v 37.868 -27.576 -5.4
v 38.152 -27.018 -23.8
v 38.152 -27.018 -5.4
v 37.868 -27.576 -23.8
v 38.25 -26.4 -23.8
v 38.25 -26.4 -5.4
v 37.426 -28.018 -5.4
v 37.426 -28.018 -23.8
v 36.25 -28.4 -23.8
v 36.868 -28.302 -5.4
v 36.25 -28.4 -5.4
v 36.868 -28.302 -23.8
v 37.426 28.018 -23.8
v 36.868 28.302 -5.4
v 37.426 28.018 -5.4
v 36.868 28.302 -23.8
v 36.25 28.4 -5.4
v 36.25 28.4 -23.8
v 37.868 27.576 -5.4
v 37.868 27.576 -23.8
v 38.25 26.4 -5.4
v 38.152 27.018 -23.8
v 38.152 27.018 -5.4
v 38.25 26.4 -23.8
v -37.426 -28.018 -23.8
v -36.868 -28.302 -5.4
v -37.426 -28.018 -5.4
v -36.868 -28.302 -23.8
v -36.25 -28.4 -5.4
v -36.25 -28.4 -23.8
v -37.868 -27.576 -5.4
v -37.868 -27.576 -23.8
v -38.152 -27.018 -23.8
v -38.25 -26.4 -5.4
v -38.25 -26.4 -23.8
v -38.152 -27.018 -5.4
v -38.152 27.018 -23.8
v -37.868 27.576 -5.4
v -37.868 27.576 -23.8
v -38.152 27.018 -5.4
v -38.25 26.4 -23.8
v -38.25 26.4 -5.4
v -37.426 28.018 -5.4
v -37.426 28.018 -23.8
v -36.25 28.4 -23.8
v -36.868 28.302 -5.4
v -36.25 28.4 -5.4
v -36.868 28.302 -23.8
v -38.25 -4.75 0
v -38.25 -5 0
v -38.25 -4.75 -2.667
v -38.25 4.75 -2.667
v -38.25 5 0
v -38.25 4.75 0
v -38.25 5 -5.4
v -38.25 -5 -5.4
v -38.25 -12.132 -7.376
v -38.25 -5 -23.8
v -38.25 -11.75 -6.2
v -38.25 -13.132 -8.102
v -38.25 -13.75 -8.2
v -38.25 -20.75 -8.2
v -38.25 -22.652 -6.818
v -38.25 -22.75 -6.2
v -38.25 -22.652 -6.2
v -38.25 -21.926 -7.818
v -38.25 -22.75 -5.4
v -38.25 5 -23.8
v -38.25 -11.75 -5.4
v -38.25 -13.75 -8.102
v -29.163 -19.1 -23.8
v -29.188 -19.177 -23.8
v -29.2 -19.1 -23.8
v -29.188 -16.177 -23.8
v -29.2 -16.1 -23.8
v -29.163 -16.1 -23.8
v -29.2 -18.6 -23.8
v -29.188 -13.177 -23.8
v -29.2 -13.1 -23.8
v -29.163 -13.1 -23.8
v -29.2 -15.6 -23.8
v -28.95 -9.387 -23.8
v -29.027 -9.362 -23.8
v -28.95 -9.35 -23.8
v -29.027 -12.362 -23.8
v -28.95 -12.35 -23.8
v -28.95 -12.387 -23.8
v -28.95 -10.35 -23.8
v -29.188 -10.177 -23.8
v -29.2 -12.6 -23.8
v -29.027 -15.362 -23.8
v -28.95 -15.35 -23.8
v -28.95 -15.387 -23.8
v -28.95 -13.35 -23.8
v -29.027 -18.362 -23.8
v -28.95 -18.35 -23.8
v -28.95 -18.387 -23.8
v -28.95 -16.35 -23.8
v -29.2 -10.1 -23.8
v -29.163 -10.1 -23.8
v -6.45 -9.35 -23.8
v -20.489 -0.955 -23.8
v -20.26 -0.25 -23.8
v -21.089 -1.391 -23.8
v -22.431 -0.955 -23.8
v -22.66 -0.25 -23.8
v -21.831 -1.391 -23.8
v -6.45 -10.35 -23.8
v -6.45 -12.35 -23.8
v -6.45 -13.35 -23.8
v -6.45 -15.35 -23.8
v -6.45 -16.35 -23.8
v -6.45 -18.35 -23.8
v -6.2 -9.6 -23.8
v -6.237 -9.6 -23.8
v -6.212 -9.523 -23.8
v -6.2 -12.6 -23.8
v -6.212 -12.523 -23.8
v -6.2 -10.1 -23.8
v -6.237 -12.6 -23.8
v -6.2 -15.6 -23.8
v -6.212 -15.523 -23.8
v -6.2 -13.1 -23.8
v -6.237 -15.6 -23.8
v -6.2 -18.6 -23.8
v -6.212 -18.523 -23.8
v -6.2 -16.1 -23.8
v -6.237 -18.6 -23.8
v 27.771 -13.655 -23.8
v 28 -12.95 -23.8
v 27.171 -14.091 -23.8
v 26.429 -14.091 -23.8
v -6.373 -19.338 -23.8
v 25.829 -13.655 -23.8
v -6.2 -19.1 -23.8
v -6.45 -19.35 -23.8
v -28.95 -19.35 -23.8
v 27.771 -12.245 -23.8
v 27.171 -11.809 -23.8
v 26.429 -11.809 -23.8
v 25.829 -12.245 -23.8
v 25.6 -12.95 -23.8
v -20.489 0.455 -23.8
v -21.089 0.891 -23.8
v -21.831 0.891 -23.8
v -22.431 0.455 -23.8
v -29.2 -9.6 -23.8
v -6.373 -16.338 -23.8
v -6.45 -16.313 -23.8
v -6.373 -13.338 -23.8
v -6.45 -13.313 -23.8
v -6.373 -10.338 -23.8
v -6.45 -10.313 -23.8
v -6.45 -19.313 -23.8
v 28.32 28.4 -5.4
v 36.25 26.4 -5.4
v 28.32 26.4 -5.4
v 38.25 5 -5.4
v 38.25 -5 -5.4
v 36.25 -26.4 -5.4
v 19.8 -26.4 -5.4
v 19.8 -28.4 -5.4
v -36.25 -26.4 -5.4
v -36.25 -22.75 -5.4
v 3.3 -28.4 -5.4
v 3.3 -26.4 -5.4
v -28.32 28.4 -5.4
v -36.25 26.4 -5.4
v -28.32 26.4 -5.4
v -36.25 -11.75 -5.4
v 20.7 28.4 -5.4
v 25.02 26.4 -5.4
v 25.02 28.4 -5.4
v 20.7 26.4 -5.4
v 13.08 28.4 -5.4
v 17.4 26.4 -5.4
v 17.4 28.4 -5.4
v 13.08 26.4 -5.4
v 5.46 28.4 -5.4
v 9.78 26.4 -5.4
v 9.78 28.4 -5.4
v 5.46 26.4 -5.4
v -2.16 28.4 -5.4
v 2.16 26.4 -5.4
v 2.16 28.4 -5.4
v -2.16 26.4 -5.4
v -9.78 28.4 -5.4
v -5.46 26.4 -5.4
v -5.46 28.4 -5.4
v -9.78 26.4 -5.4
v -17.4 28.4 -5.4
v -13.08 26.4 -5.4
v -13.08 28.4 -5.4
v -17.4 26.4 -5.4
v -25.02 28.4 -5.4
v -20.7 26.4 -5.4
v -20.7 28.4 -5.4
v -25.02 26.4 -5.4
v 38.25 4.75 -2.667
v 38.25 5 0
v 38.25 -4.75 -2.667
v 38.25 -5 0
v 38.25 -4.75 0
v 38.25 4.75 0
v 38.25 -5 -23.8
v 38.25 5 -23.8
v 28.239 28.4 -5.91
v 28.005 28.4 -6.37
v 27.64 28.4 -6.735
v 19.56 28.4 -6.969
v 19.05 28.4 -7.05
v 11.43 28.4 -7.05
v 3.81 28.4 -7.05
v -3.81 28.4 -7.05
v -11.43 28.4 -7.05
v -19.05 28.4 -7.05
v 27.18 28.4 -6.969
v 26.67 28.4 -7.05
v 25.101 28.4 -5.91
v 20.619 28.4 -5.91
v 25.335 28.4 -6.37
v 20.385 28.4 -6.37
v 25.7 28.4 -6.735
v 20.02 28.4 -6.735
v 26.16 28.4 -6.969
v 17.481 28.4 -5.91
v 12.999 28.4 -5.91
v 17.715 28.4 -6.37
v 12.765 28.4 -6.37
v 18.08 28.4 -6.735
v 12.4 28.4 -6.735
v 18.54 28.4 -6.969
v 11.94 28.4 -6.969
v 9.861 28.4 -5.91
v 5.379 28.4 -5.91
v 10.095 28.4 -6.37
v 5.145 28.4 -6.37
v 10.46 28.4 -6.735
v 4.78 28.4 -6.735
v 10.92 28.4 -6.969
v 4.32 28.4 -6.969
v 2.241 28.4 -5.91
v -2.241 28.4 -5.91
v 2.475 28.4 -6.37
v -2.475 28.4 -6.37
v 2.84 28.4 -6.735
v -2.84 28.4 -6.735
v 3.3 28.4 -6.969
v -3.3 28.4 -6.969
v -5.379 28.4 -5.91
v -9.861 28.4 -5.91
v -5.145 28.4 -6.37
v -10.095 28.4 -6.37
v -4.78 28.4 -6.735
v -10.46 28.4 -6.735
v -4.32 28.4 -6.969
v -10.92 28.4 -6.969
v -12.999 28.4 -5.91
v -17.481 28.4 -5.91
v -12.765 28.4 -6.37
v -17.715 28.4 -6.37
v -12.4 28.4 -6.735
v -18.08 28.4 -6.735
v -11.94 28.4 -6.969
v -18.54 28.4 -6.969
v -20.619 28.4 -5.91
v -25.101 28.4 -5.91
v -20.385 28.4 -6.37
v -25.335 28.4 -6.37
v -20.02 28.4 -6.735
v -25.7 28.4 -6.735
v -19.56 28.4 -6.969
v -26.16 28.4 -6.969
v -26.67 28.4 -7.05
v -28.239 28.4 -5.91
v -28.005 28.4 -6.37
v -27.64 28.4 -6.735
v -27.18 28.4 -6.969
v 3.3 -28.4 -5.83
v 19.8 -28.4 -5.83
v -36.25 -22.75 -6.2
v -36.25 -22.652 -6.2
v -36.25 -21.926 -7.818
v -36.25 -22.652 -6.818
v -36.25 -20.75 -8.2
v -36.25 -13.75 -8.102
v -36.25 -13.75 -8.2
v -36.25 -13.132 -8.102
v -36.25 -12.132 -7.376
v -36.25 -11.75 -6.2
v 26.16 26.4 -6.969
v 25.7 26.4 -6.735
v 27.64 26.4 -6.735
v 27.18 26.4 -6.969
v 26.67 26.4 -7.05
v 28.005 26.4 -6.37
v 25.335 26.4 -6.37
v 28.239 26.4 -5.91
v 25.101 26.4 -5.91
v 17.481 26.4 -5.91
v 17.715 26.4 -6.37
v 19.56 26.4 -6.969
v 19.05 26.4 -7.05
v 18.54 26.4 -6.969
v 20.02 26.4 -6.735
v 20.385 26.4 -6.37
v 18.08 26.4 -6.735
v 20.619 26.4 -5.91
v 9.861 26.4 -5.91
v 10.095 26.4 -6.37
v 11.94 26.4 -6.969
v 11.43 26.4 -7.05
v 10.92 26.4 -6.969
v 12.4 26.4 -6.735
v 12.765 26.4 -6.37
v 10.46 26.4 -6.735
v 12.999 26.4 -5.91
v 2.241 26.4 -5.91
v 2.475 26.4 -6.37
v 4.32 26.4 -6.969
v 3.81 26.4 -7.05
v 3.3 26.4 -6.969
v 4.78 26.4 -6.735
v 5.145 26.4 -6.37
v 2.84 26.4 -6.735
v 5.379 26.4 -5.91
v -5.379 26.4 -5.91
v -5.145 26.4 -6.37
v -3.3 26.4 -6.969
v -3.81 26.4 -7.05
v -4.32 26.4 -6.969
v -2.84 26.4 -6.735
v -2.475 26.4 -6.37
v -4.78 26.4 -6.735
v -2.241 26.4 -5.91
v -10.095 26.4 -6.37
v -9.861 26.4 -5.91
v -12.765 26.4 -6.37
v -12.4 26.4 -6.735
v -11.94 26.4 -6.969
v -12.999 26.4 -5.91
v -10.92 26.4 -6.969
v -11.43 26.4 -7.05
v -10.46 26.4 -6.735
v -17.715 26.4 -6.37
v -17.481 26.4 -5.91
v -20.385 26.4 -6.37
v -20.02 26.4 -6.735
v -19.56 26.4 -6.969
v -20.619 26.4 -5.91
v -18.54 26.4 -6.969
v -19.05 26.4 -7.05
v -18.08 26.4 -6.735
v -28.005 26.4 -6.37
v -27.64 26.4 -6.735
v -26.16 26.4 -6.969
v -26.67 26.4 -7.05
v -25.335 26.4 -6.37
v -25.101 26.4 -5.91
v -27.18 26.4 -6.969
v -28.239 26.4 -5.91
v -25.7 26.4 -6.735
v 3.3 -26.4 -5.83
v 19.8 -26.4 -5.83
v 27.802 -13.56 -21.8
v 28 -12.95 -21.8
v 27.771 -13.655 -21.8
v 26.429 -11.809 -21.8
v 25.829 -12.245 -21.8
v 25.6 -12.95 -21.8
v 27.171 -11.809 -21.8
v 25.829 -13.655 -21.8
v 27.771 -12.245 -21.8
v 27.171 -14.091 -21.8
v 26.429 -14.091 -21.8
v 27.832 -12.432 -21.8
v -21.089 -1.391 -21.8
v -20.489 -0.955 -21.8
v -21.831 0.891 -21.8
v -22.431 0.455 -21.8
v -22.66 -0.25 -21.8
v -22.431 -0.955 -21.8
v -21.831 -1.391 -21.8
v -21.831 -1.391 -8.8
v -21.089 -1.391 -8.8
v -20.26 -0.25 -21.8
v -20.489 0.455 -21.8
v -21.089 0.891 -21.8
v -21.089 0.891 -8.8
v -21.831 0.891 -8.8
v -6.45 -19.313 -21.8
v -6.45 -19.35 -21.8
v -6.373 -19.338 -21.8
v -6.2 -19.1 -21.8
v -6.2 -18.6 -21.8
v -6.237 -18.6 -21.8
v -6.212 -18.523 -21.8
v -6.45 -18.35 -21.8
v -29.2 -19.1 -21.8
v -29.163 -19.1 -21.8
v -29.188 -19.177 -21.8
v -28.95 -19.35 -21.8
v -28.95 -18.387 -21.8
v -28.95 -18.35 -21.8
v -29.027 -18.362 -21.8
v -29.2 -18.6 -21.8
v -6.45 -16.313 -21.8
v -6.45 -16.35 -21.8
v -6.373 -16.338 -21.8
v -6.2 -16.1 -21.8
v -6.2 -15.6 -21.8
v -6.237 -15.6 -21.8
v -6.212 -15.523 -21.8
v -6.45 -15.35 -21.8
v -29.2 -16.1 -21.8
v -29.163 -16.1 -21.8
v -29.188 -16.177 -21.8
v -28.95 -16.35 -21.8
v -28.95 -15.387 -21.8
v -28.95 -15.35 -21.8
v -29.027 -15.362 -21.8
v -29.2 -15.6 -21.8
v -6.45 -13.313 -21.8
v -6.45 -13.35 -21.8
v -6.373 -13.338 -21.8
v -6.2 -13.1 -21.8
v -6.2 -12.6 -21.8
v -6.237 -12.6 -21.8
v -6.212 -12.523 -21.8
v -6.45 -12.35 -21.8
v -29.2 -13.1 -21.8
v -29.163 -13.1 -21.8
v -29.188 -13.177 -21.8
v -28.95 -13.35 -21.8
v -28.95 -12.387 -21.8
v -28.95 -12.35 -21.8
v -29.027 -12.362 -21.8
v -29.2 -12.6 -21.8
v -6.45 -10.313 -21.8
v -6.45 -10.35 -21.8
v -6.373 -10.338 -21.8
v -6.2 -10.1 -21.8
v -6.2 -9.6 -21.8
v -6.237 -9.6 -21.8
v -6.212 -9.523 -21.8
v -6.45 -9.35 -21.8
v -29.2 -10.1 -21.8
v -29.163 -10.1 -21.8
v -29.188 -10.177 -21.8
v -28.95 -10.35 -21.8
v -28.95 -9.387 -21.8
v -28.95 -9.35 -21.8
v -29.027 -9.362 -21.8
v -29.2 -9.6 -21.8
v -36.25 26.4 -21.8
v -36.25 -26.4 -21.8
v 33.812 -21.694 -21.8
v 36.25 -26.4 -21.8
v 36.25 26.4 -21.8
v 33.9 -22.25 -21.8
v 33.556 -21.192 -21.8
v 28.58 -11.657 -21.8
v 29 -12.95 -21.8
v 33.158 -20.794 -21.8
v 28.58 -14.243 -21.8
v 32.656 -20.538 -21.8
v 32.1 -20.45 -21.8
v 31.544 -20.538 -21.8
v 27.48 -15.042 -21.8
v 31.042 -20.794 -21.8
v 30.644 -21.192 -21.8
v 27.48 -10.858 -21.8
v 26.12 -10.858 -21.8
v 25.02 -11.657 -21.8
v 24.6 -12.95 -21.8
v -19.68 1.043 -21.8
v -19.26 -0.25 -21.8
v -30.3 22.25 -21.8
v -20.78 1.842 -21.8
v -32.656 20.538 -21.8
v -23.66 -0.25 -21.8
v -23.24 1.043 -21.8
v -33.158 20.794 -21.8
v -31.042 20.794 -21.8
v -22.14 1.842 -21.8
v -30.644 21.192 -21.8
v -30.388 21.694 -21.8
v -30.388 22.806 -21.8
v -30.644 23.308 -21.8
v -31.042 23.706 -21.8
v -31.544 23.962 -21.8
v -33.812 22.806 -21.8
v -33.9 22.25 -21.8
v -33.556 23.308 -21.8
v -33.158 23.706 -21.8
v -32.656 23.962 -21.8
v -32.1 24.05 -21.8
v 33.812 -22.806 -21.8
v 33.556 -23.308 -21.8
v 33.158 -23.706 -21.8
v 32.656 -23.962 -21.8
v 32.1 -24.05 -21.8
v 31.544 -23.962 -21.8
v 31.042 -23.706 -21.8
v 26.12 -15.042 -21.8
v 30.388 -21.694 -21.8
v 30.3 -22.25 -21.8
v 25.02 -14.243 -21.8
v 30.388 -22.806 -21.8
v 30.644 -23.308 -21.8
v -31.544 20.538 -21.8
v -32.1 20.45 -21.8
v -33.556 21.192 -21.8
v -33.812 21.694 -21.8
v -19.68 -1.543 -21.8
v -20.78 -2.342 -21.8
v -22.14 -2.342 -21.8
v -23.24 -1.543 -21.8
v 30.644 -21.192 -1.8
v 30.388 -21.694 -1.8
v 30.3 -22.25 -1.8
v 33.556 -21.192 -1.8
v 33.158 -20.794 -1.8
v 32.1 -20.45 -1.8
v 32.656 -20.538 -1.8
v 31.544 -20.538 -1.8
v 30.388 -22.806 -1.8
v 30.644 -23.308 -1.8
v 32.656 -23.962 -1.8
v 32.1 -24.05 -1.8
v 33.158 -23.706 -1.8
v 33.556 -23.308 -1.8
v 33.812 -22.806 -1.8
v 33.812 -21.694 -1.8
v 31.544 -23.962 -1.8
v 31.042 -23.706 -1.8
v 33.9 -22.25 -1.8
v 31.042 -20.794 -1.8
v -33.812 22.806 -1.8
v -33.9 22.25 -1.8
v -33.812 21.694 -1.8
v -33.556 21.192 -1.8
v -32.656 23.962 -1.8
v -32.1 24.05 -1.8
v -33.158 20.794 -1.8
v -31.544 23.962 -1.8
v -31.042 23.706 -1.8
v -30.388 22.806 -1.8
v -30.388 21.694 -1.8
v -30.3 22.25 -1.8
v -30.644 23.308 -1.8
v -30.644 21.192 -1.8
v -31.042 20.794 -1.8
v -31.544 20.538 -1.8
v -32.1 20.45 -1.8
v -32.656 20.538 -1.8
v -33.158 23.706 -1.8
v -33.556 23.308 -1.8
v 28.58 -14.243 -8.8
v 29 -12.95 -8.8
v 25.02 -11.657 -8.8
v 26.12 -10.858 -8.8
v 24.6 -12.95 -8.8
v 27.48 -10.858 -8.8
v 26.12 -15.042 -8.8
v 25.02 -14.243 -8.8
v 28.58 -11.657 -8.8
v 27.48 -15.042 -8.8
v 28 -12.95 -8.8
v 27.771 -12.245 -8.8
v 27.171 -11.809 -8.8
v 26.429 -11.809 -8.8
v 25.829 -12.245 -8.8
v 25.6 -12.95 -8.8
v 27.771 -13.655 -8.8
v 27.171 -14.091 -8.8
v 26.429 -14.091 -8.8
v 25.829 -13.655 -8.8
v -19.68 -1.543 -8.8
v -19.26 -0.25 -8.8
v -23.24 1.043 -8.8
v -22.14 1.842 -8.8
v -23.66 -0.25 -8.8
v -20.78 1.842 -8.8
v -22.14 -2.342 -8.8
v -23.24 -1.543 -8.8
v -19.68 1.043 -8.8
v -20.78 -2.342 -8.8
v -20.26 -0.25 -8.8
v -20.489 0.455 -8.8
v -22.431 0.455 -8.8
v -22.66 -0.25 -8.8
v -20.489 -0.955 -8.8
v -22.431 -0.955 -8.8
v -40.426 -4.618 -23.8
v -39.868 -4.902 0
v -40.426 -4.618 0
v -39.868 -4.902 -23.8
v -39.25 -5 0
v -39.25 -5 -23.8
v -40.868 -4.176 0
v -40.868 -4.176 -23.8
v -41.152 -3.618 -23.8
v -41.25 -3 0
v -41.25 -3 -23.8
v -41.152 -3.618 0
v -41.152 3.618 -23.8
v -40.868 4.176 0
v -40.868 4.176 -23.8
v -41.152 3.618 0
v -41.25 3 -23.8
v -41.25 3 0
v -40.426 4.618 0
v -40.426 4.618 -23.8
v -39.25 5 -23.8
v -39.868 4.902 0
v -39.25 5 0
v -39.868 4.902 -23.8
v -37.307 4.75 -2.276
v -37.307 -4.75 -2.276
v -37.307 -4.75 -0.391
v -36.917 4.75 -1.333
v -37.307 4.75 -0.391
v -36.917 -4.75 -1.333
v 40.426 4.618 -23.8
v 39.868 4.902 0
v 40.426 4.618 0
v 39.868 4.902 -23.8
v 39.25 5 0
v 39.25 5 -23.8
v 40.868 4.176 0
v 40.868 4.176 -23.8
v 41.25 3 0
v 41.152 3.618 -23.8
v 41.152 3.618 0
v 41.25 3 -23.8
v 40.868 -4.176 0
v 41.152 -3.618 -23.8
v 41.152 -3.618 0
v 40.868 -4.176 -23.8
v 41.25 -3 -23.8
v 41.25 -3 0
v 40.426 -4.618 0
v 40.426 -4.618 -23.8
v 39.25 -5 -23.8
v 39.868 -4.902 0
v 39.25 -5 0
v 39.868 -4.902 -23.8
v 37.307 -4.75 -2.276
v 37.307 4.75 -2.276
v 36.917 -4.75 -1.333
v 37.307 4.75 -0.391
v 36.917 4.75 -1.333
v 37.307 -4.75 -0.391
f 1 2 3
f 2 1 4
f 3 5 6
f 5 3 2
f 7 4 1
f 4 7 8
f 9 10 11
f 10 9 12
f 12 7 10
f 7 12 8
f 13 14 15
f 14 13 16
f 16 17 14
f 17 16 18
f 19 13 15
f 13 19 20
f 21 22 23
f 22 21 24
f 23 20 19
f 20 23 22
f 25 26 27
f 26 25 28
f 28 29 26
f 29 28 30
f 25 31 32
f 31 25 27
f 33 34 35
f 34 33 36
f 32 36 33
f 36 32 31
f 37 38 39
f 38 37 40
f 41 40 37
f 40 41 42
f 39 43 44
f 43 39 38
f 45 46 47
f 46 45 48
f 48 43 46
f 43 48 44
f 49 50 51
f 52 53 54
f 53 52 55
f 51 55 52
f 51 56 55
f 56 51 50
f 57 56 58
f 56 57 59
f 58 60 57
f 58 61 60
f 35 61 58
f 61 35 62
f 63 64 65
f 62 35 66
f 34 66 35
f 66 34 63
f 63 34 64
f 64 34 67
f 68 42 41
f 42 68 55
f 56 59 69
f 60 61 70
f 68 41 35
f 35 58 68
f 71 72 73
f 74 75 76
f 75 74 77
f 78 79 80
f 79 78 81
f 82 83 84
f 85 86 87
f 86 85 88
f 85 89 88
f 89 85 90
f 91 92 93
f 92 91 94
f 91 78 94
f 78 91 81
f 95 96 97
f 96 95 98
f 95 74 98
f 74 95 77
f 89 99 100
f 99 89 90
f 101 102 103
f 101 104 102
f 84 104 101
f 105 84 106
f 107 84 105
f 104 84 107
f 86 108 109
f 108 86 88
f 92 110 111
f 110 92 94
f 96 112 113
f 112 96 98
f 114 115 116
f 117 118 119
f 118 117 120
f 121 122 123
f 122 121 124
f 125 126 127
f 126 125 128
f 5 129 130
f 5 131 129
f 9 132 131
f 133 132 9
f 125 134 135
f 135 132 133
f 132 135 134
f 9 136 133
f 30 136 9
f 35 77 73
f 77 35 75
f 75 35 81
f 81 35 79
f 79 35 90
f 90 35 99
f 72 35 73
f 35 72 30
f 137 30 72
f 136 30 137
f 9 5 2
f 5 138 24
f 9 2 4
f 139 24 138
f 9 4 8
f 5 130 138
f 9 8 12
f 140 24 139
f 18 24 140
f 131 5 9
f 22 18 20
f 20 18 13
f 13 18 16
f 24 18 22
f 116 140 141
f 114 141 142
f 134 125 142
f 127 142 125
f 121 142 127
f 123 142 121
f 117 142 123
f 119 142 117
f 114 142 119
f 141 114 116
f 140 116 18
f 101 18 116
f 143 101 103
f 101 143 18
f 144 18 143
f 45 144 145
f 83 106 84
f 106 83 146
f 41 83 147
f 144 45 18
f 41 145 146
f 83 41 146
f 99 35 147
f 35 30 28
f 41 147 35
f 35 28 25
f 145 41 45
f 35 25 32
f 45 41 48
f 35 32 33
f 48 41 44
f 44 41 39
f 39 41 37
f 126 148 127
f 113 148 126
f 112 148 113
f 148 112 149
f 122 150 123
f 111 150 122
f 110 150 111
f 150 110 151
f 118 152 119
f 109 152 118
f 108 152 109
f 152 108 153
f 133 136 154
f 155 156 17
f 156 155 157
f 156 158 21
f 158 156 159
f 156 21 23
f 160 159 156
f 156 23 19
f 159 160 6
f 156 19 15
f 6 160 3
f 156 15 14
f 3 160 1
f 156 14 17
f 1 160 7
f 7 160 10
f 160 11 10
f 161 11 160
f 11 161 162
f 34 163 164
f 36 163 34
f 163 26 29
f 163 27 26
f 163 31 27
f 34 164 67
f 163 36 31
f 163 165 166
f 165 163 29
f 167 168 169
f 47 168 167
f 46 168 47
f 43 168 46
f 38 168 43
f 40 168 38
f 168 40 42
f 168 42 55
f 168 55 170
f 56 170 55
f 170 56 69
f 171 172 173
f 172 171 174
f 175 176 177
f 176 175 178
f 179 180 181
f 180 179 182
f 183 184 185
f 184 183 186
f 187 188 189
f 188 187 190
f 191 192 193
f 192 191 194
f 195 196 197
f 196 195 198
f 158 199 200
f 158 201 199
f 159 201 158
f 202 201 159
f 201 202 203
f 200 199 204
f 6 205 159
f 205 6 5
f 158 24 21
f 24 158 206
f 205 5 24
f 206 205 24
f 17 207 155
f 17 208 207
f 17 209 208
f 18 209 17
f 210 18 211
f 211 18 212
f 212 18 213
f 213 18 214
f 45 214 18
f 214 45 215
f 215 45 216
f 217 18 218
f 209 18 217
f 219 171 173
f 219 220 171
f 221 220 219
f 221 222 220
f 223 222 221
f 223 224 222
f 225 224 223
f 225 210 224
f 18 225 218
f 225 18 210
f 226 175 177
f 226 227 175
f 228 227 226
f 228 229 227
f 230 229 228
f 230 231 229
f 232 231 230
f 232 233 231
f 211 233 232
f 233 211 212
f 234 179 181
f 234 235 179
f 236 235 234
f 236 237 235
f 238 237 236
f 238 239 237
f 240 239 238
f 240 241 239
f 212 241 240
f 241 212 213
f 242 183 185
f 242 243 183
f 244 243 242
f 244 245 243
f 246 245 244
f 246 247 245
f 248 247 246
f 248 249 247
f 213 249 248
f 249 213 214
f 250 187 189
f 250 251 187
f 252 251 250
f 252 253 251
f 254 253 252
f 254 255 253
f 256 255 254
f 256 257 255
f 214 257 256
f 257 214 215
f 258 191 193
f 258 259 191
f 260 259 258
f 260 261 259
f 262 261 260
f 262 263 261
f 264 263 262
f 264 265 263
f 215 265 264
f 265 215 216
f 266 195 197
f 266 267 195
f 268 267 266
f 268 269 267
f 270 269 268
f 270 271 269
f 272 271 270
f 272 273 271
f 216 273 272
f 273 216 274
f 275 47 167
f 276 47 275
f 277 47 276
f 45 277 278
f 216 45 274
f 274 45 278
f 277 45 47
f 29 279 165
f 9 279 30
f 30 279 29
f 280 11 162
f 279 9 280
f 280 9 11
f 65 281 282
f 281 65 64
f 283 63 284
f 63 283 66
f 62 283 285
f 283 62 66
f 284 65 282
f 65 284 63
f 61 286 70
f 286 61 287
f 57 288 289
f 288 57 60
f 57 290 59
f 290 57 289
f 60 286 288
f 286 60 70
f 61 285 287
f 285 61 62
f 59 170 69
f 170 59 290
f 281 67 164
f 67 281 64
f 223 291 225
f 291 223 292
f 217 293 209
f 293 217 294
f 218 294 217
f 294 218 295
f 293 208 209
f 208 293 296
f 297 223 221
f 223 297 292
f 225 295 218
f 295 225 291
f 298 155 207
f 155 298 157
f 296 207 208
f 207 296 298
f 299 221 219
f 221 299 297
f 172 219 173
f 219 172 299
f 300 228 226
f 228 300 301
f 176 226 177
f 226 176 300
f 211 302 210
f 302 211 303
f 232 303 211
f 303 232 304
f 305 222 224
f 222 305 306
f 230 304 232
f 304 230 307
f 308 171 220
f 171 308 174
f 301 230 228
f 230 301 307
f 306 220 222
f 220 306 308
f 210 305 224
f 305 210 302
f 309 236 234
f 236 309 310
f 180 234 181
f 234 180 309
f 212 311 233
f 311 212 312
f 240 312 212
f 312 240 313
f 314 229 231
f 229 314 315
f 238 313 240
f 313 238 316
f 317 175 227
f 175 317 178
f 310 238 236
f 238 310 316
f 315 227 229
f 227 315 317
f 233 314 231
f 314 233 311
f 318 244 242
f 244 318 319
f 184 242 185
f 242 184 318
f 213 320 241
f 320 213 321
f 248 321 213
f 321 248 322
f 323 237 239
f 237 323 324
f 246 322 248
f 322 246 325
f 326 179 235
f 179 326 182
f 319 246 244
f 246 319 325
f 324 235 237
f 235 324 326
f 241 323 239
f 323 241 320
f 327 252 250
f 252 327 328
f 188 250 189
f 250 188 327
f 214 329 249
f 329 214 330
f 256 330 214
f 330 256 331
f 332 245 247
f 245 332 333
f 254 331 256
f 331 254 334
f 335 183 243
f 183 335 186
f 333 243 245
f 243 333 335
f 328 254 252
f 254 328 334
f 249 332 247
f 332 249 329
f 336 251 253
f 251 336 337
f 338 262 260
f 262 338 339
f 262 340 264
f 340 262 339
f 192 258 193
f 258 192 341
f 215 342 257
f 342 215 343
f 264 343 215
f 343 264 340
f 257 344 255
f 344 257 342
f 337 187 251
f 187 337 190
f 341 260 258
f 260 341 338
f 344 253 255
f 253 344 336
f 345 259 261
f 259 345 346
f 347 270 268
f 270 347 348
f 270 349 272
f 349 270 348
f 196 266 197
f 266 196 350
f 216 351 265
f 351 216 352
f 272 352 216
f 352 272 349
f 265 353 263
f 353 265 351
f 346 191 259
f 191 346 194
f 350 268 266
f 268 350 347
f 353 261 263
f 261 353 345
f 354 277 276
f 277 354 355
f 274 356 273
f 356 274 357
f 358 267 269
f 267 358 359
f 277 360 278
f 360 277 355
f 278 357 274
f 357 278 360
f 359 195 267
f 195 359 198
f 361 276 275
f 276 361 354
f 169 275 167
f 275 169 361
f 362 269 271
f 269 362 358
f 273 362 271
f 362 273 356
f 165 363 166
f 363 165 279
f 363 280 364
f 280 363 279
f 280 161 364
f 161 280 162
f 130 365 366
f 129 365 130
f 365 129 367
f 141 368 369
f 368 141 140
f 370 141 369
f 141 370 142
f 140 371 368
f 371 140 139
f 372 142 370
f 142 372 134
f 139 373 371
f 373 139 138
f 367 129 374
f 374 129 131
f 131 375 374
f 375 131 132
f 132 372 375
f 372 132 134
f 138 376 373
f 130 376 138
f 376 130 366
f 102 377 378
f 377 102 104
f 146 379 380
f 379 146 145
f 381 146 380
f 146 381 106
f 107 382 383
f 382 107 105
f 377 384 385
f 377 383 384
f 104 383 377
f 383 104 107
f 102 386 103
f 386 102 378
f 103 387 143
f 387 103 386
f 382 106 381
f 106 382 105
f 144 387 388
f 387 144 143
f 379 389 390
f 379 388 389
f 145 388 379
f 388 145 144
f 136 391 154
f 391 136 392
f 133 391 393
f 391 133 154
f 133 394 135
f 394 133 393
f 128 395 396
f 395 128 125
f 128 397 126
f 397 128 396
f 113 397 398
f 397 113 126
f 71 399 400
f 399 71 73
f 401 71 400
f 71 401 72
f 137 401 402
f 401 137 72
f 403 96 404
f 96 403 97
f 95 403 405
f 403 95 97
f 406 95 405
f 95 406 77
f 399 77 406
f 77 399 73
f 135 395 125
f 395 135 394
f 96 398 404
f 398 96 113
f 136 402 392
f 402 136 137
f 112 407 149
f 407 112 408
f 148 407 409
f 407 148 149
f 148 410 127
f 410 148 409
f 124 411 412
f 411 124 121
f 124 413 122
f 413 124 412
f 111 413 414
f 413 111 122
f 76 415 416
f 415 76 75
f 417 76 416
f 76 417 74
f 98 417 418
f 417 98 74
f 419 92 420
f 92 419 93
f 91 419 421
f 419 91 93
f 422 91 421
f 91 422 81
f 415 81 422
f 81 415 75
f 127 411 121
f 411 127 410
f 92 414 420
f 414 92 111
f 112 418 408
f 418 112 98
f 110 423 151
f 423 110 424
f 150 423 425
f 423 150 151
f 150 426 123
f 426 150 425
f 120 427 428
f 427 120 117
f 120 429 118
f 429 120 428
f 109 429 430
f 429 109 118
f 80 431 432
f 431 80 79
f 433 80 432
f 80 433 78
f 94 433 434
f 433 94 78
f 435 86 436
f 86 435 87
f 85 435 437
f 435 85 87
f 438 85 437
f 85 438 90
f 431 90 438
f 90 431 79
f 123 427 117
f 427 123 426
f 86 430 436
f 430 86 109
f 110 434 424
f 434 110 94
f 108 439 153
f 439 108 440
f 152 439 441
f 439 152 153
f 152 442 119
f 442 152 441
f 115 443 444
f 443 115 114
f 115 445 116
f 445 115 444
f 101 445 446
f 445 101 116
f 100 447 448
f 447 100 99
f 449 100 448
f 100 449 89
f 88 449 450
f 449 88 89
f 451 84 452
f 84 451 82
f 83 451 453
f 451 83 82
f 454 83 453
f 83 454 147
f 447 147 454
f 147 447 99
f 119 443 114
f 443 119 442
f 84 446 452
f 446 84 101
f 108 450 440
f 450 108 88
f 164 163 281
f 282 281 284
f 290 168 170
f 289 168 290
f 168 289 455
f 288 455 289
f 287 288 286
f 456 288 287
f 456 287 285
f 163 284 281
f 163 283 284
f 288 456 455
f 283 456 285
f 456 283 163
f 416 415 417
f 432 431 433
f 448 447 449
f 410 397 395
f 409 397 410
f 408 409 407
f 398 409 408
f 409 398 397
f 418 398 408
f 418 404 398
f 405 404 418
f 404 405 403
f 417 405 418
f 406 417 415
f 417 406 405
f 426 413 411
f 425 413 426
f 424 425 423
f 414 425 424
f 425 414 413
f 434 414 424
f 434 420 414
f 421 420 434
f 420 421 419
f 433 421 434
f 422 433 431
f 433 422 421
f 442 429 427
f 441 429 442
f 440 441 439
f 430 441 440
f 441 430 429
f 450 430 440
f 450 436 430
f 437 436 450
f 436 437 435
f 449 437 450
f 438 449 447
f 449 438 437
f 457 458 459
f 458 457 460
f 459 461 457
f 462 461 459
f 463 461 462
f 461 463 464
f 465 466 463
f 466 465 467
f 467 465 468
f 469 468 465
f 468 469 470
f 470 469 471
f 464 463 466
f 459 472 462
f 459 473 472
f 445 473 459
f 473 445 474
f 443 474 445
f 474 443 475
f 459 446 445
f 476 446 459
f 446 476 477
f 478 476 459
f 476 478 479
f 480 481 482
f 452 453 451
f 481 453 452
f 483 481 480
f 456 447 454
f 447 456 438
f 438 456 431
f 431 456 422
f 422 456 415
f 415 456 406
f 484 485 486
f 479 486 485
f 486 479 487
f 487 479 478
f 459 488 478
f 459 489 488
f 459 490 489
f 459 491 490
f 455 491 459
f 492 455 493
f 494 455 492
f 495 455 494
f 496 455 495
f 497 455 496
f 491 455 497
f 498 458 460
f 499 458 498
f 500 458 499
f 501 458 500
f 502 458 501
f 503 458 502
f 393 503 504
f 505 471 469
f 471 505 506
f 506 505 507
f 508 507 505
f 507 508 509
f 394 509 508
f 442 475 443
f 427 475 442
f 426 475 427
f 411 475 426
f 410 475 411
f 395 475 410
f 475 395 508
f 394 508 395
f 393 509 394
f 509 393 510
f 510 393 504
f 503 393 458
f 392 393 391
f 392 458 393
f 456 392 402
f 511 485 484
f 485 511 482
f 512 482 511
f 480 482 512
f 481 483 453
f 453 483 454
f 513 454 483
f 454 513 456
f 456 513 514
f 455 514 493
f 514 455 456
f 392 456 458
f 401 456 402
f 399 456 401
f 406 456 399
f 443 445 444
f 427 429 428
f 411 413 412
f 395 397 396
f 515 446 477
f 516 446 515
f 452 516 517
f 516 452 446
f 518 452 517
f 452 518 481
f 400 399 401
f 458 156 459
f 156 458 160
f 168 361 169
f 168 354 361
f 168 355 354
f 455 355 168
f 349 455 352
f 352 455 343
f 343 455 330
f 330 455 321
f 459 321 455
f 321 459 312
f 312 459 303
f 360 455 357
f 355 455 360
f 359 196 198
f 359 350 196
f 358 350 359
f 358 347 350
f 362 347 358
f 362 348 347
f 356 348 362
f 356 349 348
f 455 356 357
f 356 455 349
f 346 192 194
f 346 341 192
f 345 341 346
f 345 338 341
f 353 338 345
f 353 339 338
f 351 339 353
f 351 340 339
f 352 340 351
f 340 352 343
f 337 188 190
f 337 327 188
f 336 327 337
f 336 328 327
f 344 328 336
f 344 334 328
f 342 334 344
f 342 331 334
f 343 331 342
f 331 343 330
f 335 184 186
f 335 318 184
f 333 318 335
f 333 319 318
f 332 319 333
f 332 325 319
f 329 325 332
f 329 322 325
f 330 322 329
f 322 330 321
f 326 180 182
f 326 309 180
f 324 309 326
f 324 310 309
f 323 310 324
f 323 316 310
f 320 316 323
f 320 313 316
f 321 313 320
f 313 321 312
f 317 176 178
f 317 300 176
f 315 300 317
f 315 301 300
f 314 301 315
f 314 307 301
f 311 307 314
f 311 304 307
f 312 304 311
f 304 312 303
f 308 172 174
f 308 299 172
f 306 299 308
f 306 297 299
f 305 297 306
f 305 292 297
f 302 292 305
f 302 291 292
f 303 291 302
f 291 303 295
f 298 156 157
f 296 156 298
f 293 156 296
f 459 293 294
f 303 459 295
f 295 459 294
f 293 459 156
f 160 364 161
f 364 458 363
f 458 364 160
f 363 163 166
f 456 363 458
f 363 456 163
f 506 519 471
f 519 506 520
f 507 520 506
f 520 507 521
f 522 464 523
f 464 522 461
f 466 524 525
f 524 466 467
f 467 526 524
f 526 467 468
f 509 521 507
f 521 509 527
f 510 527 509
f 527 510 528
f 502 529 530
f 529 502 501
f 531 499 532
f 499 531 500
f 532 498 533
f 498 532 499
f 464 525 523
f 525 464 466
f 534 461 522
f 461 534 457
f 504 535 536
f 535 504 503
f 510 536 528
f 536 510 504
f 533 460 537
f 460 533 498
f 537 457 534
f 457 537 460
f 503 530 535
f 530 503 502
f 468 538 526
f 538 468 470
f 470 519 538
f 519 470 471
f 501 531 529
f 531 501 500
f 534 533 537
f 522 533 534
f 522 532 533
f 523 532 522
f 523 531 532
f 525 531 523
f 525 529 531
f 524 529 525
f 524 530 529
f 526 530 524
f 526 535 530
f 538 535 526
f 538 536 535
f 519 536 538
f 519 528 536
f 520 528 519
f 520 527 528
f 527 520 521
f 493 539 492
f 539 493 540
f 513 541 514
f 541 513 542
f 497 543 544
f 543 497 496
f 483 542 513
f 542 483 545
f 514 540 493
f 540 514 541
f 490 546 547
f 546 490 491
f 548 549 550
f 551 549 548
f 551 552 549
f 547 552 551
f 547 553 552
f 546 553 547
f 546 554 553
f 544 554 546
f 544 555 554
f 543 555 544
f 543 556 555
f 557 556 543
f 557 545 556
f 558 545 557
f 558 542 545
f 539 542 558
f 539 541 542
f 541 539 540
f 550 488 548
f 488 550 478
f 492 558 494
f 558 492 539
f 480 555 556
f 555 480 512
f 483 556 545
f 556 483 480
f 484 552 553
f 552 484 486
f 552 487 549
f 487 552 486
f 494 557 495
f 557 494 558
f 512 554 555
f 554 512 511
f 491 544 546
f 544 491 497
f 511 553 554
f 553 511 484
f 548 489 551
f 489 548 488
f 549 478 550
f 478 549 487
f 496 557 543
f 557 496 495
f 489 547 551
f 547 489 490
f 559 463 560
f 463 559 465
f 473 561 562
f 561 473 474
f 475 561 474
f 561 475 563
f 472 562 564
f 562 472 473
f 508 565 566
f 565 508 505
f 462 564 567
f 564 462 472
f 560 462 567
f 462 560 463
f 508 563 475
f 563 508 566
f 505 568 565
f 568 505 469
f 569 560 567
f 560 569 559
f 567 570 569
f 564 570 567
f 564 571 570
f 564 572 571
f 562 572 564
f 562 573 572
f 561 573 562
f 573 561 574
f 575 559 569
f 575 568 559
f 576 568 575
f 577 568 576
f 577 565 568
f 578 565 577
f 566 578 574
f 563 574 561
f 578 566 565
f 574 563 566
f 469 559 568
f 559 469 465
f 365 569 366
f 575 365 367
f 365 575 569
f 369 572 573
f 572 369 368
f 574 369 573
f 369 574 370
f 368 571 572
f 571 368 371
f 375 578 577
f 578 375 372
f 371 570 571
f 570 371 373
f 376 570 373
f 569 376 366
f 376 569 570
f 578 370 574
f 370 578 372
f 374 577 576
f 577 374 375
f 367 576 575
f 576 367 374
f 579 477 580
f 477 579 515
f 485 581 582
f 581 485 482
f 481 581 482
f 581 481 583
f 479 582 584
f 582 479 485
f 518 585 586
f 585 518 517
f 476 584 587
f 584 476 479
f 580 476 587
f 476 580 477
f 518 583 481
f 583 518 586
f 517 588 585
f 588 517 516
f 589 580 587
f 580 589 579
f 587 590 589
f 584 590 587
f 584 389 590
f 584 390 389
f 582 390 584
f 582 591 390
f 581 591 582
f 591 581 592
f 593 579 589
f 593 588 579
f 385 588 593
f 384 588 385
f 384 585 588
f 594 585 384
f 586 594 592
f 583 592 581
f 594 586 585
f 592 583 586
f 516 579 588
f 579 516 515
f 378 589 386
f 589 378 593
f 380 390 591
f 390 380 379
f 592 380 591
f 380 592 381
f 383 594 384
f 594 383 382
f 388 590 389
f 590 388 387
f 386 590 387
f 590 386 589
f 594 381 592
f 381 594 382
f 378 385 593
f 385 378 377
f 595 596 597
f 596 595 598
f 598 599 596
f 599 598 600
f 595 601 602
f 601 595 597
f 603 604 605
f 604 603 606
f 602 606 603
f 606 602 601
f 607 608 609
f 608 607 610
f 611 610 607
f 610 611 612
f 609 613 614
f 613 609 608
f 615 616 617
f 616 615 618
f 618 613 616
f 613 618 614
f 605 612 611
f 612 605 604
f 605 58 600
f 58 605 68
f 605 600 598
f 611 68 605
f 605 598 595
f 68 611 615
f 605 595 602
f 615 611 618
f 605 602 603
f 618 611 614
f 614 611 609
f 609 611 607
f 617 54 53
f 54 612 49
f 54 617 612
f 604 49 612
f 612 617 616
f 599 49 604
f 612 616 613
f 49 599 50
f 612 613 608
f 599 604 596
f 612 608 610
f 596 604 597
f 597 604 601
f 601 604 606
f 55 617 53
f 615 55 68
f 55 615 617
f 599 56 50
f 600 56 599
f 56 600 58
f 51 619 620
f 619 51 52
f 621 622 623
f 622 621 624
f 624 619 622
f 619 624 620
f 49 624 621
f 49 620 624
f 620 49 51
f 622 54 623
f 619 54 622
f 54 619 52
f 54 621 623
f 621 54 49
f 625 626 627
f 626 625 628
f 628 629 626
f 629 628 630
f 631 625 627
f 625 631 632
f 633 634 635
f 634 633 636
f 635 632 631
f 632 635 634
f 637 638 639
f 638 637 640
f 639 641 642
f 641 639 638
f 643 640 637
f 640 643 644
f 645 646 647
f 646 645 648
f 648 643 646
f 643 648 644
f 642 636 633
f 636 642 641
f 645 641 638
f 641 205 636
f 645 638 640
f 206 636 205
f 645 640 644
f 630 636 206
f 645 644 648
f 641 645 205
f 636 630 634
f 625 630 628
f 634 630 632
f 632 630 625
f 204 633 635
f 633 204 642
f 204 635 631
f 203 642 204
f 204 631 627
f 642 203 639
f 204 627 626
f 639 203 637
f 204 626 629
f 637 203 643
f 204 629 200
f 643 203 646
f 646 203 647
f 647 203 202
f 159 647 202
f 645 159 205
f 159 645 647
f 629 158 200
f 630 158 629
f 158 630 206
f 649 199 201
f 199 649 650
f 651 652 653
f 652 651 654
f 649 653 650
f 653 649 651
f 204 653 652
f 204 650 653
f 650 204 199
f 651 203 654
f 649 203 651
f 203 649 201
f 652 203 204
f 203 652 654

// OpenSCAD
// file: rounding.scad
/*
 Copyright (C) 2018 Karim Kanso. All Rights Reserved.

 This program is free software: you can redistribute it and/or modify
 it under the terms of the GNU General Public License as published by
 the Free Software Foundation, either version 3 of the License, or
 (at your option) any later version.

 This program is distributed in the hope that it will be useful,
 but WITHOUT ANY WARRANTY; without even the implied warranty of
 MERCHANTABILITY or FITNESS FOR A PARTICULAR PURPOSE.  See the
 GNU General Public License for more details.

 You should have received a copy of the GNU General Public License
 along with this program.  If not, see <http://www.gnu.org/licenses/>.
*/

module rounding(r,h) {
    difference() {
        cube([r+1, r+1, h+1]);
        translate([0,0,-1])
        cylinder(r=r, h=h+2);
    };
};

module rounded_cube_aux(r,x) {
    difference() {
        cube(x);
        translate([r,r,-0.5])
        rotate([0,0,180])
            rounding(r,x[2]);
        translate([r,x[1] - r,-0.5])
        rotate([0,0,90])
            rounding(r,x[2]);
        translate([x[0] - r,r,-0.5])
        rotate([0,0,270])
            rounding(r,x[2]);
        translate([x[0] - r, x[1] - r,-0.5])
            rounding(r,x[2]);
    };
};

module rounded_cube(r,x,center=false) {
    if (center) {
        translate([-x[0]/2, -x[1]/2, -x[2]/2])
          rounded_cube_aux(r,x);
    } else {
        rounded_cube_aux(r,x);
    }
};
// file: params.scad
/*
 Copyright (C) 2018 Karim Kanso. All Rights Reserved.

 This program is free software: you can redistribute it and/or modify
 it under the terms of the GNU General Public License as published by
 the Free Software Foundation, either version 3 of the License, or
 (at your option) any later version.

 This program is distributed in the hope that it will be useful,
 but WITHOUT ANY WARRANTY; without even the implied warranty of
 MERCHANTABILITY or FITNESS FOR A PARTICULAR PURPOSE.  See the
 GNU General Public License for more details.

 You should have received a copy of the GNU General Public License
 along with this program.  If not, see <http://www.gnu.org/licenses/>.
*/

pcb_width=62.4;
pcb_depth=42.7;
pcb_height = 1.2;

support_hole_diameter=1.8;
support_hole_radius = support_hole_diameter/2;

usb_port_width = 7.8;
usb_port_height = 2.8;
usb_port_standoff = 1.5;
usb_port_inset = 0.2;
usb_port_oversize_width = 1.6;
usb_port_oversize_height = 2.1;

wifi_module_width = 16;
wifi_module_height = 0.78;
wifi_module_standoff = 3;
wifi_module_inset = 11.65;
wifi_module_oversize = 0.25;

padding=3.25;

case_thickness = 2;
rounding = 2;

inside_width = pcb_width + support_hole_diameter * 2 + padding * 2;
inside_depth = pcb_depth + support_hole_diameter * 2 + padding * 2;

outside_width = inside_width + case_thickness * 2;
outside_depth = inside_depth + case_thickness * 2;

base_clearence = 4;
base_above_clearence = 3.6;

bottom_inside_height = base_clearence + pcb_height + base_above_clearence;
bottom_outside_height = bottom_inside_height + case_thickness;

pcb_base_z_offset = bottom_outside_height/2 - pcb_height - base_above_clearence;

top_clearence = 20;

top_inside_height = top_clearence - base_above_clearence;
top_outside_height = top_inside_height + case_thickness;

hob_radius = 1.65;
hob_spacing = 7.62;

// minimum 3.4
led_standoff = base_above_clearence;
if (led_standoff < 3.4) {
    color("magenta") %text("ERROR!",size=50);
    echo("ERROR: led_standoff less than 3.4");
}


button1_x = 4.4;
button1_y = 8.4;

button2_x = button1_x + 19*2.54;
button2_y = button1_y + 5*2.54;

buttons = [[button1_x, button1_y],
           [button2_x, button2_y]];

button_hole_radius = 1.2;
button_top_standoff = 7;

clip_width = 10;
clip_overhang = bottom_outside_height/2;
// main file
/*
 Copyright (C) 2018 Karim Kanso. All Rights Reserved.

 This program is free software: you can redistribute it and/or modify
 it under the terms of the GNU General Public License as published by
 the Free Software Foundation, either version 3 of the License, or
 (at your option) any later version.

 This program is distributed in the hope that it will be useful,
 but WITHOUT ANY WARRANTY; without even the implied warranty of
 MERCHANTABILITY or FITNESS FOR A PARTICULAR PURPOSE.  See the
 GNU General Public License for more details.

 You should have received a copy of the GNU General Public License
 along with this program.  If not, see <http://www.gnu.org/licenses/>.
*/

include <params.scad>
use <rounding.scad>

module leds() {
    for (i = [0:7]) {
        rotate([270,0,0])
        translate([hob_spacing*i - hob_spacing*3.5,0,0])
          cylinder(r=hob_radius, h=case_thickness+2, $fn=20);
    }
}

module cutouts() {
    // micro usb clearence
    translate([inside_width/2 - 1, -pcb_depth/2 -usb_port_oversize_width + usb_port_inset,pcb_base_z_offset + pcb_height + usb_port_standoff - usb_port_oversize_height + usb_port_height + usb_port_oversize_height*2])
        rotate([0,90,0])
      rounded_cube(2, [usb_port_height + usb_port_oversize_height*2, usb_port_width + usb_port_oversize_width*2, case_thickness + 2], $fn=10);

    // wifi module antanna clearence
    translate([-pcb_width/2 - wifi_module_oversize + wifi_module_inset,-inside_depth/2 - case_thickness - 1,pcb_base_z_offset + pcb_height + wifi_module_standoff - wifi_module_oversize])
        cube([wifi_module_width + wifi_module_oversize*2, case_thickness + 2, wifi_module_height + wifi_module_oversize*2]);

    // led clearence
    translate([0,inside_depth/2-1,pcb_base_z_offset + pcb_height + led_standoff])
        leds();
}

module clip() {
    translate([-case_thickness*1.5,-clip_width/2,0])
    difference() {
        rounded_cube(rounding, [case_thickness*3, clip_width, top_outside_height + clip_overhang], $fn=20);
        translate([-case_thickness*0.5,-0.5,-0.5])
        cube([case_thickness*2, clip_width+1, top_outside_height + clip_overhang + 1]);
    };

    translate([0,0,case_thickness/1.5])
    rotate([90,0,0])
    cylinder(r=case_thickness/1.5,h=clip_width-0.5, center=true, $fn=8);
};

module top() {
    difference() {
        translate([0,0,top_outside_height/2 + bottom_outside_height/2])
            rounded_cube(rounding, [outside_width, outside_depth, top_outside_height], center=true, $fn=20);
        translate([0,0,top_outside_height/2 + bottom_outside_height/2])
        translate([0,0,-case_thickness/2 - 0.5])
            cube([inside_width, inside_depth, top_inside_height + 1], center=true);
        cutouts();
        for (b = buttons) {
            translate([-pcb_width/2 + b[0], -pcb_depth/2 + b[1],pcb_base_z_offset + pcb_height + top_clearence - 0.5])
            cylinder(r=button_hole_radius, h=case_thickness+1, $fn=10);
        };
        for (d = [0:3:9]) {
            translate([pcb_width/2 - 23 - 2, -pcb_depth/2-1 + d + 3, pcb_base_z_offset + pcb_height + top_clearence - 0.5])
            rounded_cube(0.25, [23,1,case_thickness + 1]);
        };
    };

    for (z = [-1,1]) {
        translate([z * (pcb_width/2 + support_hole_radius),
                  z * (pcb_depth/2 + support_hole_radius),
                  0]) {
            translate([0,0,pcb_base_z_offset + pcb_height])
              cylinder(r=support_hole_diameter, h=top_clearence, $fn=20);
       };
    };

    for (b = buttons) {
        translate([-pcb_width/2 + b[0], -pcb_depth/2 + b[1],pcb_base_z_offset + pcb_height + button_top_standoff])
        difference() {
          cylinder(r=button_hole_radius + 1, h=top_clearence - button_top_standoff, $fn=10);
          translate([0, 0, - 0.5])
          cylinder(r=button_hole_radius, h=top_clearence - button_top_standoff + 1, $fn=10);
        };
    };

translate([outside_width/2, 0, 0])
    clip();

translate([-outside_width/2, 0, 0])
    rotate([0,0,180])
    clip();

};

rotate([0,180,0])
  top();
